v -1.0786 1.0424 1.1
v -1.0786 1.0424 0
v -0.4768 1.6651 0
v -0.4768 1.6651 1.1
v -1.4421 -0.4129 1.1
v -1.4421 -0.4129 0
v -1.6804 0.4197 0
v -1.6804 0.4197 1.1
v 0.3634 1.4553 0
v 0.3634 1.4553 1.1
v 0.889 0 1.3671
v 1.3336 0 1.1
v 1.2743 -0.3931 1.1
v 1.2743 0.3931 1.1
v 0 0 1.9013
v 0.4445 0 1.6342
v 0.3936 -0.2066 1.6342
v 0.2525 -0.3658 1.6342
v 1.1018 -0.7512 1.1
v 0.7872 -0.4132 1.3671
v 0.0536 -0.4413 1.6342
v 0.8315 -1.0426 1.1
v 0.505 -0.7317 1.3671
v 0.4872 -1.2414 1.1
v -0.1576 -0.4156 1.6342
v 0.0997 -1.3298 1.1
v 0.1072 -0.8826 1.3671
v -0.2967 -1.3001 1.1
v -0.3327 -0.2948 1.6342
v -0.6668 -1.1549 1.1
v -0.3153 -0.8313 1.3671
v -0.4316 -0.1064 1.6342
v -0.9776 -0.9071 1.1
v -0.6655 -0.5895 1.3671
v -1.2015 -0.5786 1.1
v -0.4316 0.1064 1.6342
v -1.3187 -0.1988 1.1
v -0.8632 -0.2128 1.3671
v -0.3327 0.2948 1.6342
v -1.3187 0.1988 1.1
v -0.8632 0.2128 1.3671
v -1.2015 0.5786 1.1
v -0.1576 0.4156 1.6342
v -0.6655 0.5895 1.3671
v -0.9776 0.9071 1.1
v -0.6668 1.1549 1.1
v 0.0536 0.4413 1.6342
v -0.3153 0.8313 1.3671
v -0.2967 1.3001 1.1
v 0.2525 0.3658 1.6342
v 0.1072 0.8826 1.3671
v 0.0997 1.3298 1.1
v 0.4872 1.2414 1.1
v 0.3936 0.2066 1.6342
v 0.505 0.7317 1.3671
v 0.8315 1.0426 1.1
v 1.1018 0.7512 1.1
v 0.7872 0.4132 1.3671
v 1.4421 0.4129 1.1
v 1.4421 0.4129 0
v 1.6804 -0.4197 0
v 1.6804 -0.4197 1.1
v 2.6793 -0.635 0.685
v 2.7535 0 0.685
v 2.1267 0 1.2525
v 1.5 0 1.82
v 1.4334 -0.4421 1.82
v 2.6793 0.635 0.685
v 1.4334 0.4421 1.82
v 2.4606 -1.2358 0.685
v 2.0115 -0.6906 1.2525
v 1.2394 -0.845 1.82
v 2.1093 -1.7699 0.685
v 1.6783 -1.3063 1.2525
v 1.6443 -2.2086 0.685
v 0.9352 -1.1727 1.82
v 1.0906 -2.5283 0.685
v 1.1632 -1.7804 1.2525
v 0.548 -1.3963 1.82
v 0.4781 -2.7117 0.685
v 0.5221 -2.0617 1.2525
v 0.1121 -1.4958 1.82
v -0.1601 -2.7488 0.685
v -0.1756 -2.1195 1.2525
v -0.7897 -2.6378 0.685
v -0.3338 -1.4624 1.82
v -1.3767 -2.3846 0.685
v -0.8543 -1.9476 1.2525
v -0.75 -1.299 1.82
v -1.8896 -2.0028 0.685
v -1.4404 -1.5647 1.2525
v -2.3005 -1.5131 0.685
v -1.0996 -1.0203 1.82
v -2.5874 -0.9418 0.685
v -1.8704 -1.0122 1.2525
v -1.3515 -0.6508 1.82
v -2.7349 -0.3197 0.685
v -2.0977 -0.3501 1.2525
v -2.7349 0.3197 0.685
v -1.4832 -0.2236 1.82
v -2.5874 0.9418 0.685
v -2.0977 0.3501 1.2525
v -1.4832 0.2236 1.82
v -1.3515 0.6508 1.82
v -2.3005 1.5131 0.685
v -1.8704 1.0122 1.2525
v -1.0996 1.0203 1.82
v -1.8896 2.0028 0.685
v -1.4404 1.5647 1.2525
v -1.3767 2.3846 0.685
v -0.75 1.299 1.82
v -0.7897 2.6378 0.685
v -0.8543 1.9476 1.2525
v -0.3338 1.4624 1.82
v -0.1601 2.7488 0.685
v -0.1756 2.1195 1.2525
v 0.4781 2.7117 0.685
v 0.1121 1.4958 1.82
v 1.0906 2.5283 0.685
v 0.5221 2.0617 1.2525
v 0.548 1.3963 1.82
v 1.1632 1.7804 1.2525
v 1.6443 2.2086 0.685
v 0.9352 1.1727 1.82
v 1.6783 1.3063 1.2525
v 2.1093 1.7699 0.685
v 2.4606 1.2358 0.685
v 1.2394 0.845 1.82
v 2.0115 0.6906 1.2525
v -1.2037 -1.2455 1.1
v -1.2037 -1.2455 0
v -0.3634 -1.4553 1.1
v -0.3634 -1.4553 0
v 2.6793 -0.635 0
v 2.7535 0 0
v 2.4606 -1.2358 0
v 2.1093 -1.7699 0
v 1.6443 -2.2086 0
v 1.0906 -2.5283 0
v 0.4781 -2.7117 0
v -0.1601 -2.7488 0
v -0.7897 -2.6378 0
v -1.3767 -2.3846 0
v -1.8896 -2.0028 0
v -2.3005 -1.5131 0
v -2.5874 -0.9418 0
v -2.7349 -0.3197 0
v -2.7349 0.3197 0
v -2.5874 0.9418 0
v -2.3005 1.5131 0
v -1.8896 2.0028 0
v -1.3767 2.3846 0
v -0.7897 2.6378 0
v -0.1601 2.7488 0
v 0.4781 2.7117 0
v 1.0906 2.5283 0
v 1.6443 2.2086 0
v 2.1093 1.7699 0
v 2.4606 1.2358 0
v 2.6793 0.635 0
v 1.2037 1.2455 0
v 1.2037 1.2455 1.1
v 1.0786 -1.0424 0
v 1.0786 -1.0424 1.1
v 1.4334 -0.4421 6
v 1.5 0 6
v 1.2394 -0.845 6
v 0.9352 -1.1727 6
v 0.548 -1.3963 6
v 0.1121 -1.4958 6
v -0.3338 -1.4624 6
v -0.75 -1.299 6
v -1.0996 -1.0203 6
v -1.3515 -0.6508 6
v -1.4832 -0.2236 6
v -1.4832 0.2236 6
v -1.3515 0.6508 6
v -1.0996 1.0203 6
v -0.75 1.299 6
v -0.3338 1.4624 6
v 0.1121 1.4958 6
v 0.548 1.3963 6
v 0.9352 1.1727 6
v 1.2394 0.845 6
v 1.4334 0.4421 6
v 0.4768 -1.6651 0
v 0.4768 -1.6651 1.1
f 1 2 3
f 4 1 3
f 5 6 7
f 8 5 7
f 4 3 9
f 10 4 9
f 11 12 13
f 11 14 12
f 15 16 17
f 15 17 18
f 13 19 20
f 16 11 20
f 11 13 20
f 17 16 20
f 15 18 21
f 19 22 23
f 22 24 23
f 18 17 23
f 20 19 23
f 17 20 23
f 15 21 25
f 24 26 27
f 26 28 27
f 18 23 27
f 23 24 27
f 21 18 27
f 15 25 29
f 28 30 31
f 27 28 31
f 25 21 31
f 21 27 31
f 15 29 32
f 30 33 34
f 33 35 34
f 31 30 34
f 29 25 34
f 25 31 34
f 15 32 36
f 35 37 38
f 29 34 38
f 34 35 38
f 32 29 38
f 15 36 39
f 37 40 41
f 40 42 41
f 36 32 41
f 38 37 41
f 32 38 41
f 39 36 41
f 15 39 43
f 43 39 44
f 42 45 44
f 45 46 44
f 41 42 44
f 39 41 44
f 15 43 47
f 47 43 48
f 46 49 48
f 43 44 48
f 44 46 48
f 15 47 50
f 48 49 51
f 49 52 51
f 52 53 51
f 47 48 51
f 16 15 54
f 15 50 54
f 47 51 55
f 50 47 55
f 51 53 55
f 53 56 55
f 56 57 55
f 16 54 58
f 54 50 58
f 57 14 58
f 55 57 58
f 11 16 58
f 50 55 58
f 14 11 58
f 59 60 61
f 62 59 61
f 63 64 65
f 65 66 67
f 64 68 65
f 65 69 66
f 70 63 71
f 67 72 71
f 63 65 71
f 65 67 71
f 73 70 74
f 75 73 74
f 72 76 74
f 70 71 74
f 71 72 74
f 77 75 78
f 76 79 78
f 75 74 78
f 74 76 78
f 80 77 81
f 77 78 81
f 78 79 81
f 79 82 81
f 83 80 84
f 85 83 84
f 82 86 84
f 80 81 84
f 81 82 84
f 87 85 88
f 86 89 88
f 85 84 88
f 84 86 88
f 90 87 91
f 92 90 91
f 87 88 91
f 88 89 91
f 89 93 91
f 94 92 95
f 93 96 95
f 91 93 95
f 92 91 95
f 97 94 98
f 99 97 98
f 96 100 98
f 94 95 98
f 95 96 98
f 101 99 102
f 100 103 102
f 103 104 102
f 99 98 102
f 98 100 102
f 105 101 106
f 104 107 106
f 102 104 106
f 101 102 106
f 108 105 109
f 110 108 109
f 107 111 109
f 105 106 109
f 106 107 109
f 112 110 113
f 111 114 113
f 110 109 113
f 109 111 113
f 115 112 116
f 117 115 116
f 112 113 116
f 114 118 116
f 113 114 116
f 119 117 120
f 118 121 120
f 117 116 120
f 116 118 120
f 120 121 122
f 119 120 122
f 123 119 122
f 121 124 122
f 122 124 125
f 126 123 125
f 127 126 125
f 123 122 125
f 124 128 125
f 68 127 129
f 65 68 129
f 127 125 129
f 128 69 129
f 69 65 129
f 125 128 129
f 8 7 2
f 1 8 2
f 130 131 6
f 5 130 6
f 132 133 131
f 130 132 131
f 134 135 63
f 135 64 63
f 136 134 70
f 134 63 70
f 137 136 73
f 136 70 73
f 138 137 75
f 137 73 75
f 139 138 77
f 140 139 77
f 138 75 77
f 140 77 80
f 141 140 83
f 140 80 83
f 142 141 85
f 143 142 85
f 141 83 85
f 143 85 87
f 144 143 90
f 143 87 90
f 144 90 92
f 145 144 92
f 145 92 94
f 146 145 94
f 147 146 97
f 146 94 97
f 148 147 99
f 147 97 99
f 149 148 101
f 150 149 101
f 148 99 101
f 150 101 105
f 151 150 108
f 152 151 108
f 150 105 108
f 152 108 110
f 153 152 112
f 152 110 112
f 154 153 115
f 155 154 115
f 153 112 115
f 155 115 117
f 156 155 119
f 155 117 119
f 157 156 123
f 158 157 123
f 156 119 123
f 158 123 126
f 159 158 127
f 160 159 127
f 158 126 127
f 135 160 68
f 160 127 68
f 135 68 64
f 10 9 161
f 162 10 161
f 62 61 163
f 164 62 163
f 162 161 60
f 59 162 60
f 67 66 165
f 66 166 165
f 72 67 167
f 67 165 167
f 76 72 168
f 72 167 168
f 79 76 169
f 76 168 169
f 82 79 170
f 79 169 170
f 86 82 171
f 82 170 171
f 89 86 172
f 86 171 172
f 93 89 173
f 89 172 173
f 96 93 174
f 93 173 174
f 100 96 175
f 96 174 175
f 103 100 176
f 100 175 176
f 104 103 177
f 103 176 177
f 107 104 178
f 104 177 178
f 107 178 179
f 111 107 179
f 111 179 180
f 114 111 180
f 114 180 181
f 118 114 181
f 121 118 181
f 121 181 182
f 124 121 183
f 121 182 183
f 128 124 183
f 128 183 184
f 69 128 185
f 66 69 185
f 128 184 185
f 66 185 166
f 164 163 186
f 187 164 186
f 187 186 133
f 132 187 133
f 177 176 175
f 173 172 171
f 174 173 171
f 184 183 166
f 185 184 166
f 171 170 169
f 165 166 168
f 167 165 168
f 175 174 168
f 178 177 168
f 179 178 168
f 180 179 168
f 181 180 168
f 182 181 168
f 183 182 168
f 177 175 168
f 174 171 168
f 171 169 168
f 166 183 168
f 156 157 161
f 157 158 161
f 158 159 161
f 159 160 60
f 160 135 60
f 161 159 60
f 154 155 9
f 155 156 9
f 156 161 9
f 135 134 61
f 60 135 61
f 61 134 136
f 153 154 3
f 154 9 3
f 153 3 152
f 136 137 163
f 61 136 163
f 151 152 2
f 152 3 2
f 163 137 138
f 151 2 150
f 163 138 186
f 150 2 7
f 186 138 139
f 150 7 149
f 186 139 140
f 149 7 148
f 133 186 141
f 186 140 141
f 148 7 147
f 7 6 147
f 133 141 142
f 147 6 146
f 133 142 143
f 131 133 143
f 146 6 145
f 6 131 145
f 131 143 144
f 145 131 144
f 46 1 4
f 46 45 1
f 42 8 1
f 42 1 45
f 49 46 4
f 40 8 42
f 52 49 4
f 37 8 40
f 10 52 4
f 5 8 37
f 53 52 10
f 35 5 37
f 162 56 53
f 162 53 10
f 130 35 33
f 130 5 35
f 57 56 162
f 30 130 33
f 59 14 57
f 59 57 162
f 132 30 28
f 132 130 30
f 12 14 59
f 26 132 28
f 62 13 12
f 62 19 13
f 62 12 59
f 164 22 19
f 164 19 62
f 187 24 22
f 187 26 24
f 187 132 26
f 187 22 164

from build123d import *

# Parameters (mm, degrees)
F3_D     = 3
F3_DEPTH = 1
F3_TIP   = 0.9012909285
F5_DEPTH = 1.1


with BuildPart() as f1:
    # F0 (on Front) → F1 (revolve)
    with BuildSketch(Plane.XZ):
        Polygon((1.5, 6), (0, 6), (0, 0), (2.753497507, 0), (2.753497507, 0.685), (1.5, 1.82), align=None)
    revolve(axis=Axis((0, 0, 3), (0, 0, -1)))

    # F3
    with Locations(Plane(origin=(0, 0, 0), x_dir=(1, 0, 0), z_dir=(0, 0, -1))):
        with Locations((0, 0)):
            Hole(F3_D / 2, depth=F3_DEPTH)
            with Locations((0, 0, -(F3_DEPTH + F3_TIP / 2))):  # 118° drill point
                Cone(0, F3_D / 2, F3_TIP, mode=Mode.SUBTRACT)

    # F4 (on face) → F5 (cut)
    with BuildSketch(Plane(origin=(0, 0, 0), x_dir=(1, 0, 0), z_dir=(0, 0, -1))):
        with BuildLine():
            ThreePointArc((1.4420504443, -0.4129049722), (1.4854419656, -0.2084758182), (1.5, 0))
            ThreePointArc((1.5, 0), (1.3906683924, 0.5621756153), (1.0786114367, 1.0423998122))
            ThreePointArc((1.0786114367, 1.0423998122), (0.4129049995, 1.4420504365), (-0.3634389987, 1.4553048114))
            ThreePointArc((-0.3634389987, 1.4553048114), (-1.0423998218, 1.0786114275), (-1.4420504443, 0.4129049722))
            ThreePointArc((-1.4420504443, 0.4129049722), (-1.4553048039, -0.363439029), (-1.0786114144, -1.0423998354))
            ThreePointArc((-1.0786114144, -1.0423998354), (-0.412904984, -1.4420504409), (0.3634389987, -1.4553048114))
            ThreePointArc((0.3634389987, -1.4553048114), (1.0423998218, -1.0786114275), (1.4420504443, -0.4129049722))
        make_face()
        with BuildLine():
            ThreePointArc((1.0786114367, 1.0423998122), (1.3906683924, 0.5621756153), (1.5, 0))
            ThreePointArc((1.5, 0), (1.4854419656, -0.2084758182), (1.4420504443, -0.4129049722))
            Line((1.4420504443, -0.4129049722), (1.680441244, 0.4196632286))
            Line((1.680441244, 0.4196632286), (1.0786114367, 1.0423998122))
        make_face()
        with BuildLine():
            ThreePointArc((-0.3634389987, 1.4553048114), (0.4129049995, 1.4420504365), (1.0786114367, 1.0423998122))
            Line((1.0786114367, 1.0423998122), (0.476781605, 1.6651364212))
            Line((0.476781605, 1.6651364212), (-0.3634389987, 1.4553048114))
        make_face()
        with BuildLine():
            Line((1.203659639, -1.2454731926), (1.4420504443, -0.4129049722))
            ThreePointArc((1.4420504443, -0.4129049722), (1.0423998218, -1.0786114275), (0.3634389987, -1.4553048114))
            Line((0.3634389987, -1.4553048114), (1.203659639, -1.2454731926))
        make_face()
        with BuildLine():
            ThreePointArc((-1.4420504443, 0.4129049722), (-1.0423998218, 1.0786114275), (-0.3634389987, 1.4553048114))
            Line((-0.3634389987, 1.4553048114), (-1.203659639, 1.2454731926))
            Line((-1.203659639, 1.2454731926), (-1.4420504443, 0.4129049722))
        make_face()
        with BuildLine():
            Line((-0.476781605, -1.6651364212), (0.3634389987, -1.4553048114))
            ThreePointArc((0.3634389987, -1.4553048114), (-0.412904984, -1.4420504409), (-1.0786114144, -1.0423998354))
            Line((-1.0786114144, -1.0423998354), (-0.476781605, -1.6651364212))
        make_face()
        with BuildLine():
            ThreePointArc((-1.0786114144, -1.0423998354), (-1.4553048039, -0.363439029), (-1.4420504443, 0.4129049722))
            Line((-1.4420504443, 0.4129049722), (-1.680441244, -0.4196632286))
            Line((-1.680441244, -0.4196632286), (-1.0786114144, -1.0423998354))
        make_face()
    extrude(amount=-F5_DEPTH, mode=Mode.SUBTRACT)


solid = f1.part
